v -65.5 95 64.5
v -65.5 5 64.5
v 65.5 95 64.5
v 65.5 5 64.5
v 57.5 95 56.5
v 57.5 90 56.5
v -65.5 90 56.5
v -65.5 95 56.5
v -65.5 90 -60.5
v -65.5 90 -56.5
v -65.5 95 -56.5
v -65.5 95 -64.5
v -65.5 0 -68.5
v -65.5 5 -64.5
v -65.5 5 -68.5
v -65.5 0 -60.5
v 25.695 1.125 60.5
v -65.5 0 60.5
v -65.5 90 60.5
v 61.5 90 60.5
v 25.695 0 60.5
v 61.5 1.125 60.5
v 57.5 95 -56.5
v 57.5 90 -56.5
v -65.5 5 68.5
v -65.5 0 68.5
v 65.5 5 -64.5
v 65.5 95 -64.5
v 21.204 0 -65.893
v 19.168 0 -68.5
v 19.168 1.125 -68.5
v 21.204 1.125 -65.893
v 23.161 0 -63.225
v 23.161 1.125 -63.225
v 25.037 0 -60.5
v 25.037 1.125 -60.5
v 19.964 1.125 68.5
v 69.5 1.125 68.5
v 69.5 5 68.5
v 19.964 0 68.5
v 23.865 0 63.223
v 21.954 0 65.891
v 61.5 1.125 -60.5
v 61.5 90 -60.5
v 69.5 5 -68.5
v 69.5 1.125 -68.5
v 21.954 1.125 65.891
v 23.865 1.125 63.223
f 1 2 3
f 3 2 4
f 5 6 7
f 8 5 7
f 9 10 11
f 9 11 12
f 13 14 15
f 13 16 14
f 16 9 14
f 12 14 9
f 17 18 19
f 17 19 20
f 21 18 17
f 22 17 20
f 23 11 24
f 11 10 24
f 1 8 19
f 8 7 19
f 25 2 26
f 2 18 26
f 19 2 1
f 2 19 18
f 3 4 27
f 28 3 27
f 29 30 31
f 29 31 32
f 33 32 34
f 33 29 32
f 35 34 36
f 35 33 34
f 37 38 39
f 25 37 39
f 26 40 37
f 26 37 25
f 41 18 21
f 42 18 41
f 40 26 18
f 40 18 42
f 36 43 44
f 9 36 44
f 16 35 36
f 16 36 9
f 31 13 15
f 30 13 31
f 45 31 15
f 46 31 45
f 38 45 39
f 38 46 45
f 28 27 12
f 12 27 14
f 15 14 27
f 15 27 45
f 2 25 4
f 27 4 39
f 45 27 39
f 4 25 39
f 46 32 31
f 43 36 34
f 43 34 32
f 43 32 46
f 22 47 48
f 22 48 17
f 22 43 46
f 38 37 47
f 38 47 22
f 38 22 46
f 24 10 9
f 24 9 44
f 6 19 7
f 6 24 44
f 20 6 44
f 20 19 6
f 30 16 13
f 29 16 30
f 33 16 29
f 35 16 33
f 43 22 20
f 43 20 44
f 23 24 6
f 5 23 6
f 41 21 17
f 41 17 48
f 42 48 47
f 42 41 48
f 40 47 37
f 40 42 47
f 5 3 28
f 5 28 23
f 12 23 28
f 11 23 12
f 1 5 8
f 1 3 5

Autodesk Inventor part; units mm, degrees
ref_plane "YZ Plane" through (0, 0, 0) normal (1, 0, 0) x (0, 1, 0)
ref_plane "XZ Plane" through (0, 0, 0) normal (0, 1, 0) x (-1, 0, 0)
ref_plane "XY Plane" through (0, 0, 0) normal (0, 0, 1) x (1, 0, 0)
sketch "Sketch8" plane through (0, 0, 0) normal (0, 1, 0) x (-1, 0, 0)
  line L0 (-65.5, -64.5) -> (65.5, -64.5)
  line L1 (65.5, -64.5) -> (65.5, 64.5)
  line L2 (65.5, 64.5) -> (-65.5, 64.5)
  line L3 (-65.5, 64.5) -> (-65.5, -64.5)
  line L4 (-65.5, -64.5) -> (65.5, 64.5) construction
  line L5 (65.5, -64.5) -> (-65.5, 64.5) construction
  point P0 (0, 0)
  dimension "d26" = 131
  dimension "d27" = 129
extrude "Extrusion7" add sketch "Sketch8" along normal blind 95
sketch "Sketch9" plane through (0, 0, 0) normal (0, -1, 0) x (1, 0, 0)
  line L0 (-65.5, 64.5) -> (65.5, 64.5) projected
  line L1 (-65.5, -64.5) -> (65.5, -64.5)
  line L2 (65.5, -64.5) -> (65.5, 64.5)
  line L3 (65.5, 64.5) -> (-65.5, 64.5)
  line L4 (-65.5, 64.5) -> (-65.5, -64.5)
  line L5 (-65.5, -64.5) -> (65.5, 64.5) construction
  line L6 (65.5, -64.5) -> (-65.5, 64.5) construction
  line L7 (61.5, 60.5) -> (61.5, -60.5)
  line L8 (61.5, -60.5) -> (-65.5, -60.5)
  line L9 (-65.5, 60.5) -> (61.5, 60.5)
  line L10 (57.5, -56.5) -> (57.5, 56.5)
  line L11 (57.5, 56.5) -> (-65.5, 56.5)
  line L12 (-65.5, -56.5) -> (57.5, -56.5)
  line L13 (-63.4537, -60.5) -> (-63.4537, -62.485)
  line L14 (-63.4537, 62.485) -> (-63.4537, 60.5)
  line L15 (-59.3922, 56.5) -> (-59.3922, 58.4854)
  line L16 (-59.3922, -58.4854) -> (-59.3922, -56.5)
  point P0 (0, 0)
  dimension "d30" = 4
  dimension "d31" = 4
  dimension "d47" = 4
  dimension "d48" = 4
  dimension "d49" = 4
  dimension "d50" = 4
extrude "Extrusion8" cut sketch "Sketch9" against normal blind 115 contours L11 L10 L12 L4
extrude "Extrusion9" cut sketch "Sketch9" against normal blind 90 contours L9 L7 L8 L4 L12 L10 L11
sketch "Sketch10" plane through (0, 0, 0) normal (0, -1, 0) x (1, 0, 0)
  line L0 (65.5, -64.5) -> (-65.5, -64.5)
  line L1 (-65.5, -64.5) -> (-65.5, 64.5)
  line L2 (-65.5, 64.5) -> (65.5, 64.5)
  line L3 (65.5, 64.5) -> (65.5, -64.5)
  line L4 (65.5, -64.5) -> (-65.5, 64.5) construction
  line L5 (-65.5, -64.5) -> (65.5, 64.5) construction
  line L6 (-69.5, 68.5) -> (-69.5, -68.5)
  line L7 (-69.5, -68.5) -> (69.5, -68.5)
  line L8 (69.5, -68.5) -> (69.5, 68.5)
  line L9 (69.5, 68.5) -> (-69.5, 68.5)
  line L10 (-65.5, 64.5) -> (-69.5, 64.5)
  line L11 (-65.5, -64.5) -> (-69.5, -64.5)
  line L12 (-65.5, 64.5) -> (-65.5, 68.5)
  line L13 (-65.5, -64.5) -> (-65.5, -68.5)
  point P0 (0, 0)
  dimension "d36" = 4
extrude "Extrusion10" add sketch "Sketch10" against normal blind 5 contours L3 L2 L12 L9 L8 L7 L13 L0
sketch "Sketch11" plane through (0, 0, 0) normal (0, -1, 0) x (1, 0, 0)
  circle A0 centre (-66.5, 0.5) radius 135
  line L0 (61.5, 60.5) -> (61.5, -60.5) projected
  line L1 (69.5, -68.5) -> (69.5, 68.5) projected
  circle A1 centre (-66.5, 0.5) radius 110
  line L2 (19.168, -68.5) -> (69.5, -68.5)
  line L3 (69.5, -68.5) -> (69.5, 68.5)
  line L4 (69.5, 68.5) -> (19.9639, 68.5)
  line L5 (-65.5, 68.5) -> (69.5, 68.5) projected
  point P0 (0, 0)
  dimension "d39" = 270
  dimension "d41" = 136
  dimension "d42" = 220
extrude "Extrusion11" cut sketch "Sketch11" against normal blind 1.125 contours A0 L0 | A0 L4 L1 L2 | L0 A0 L2 A1 L4
properties part number "Galvo Housing-01"
